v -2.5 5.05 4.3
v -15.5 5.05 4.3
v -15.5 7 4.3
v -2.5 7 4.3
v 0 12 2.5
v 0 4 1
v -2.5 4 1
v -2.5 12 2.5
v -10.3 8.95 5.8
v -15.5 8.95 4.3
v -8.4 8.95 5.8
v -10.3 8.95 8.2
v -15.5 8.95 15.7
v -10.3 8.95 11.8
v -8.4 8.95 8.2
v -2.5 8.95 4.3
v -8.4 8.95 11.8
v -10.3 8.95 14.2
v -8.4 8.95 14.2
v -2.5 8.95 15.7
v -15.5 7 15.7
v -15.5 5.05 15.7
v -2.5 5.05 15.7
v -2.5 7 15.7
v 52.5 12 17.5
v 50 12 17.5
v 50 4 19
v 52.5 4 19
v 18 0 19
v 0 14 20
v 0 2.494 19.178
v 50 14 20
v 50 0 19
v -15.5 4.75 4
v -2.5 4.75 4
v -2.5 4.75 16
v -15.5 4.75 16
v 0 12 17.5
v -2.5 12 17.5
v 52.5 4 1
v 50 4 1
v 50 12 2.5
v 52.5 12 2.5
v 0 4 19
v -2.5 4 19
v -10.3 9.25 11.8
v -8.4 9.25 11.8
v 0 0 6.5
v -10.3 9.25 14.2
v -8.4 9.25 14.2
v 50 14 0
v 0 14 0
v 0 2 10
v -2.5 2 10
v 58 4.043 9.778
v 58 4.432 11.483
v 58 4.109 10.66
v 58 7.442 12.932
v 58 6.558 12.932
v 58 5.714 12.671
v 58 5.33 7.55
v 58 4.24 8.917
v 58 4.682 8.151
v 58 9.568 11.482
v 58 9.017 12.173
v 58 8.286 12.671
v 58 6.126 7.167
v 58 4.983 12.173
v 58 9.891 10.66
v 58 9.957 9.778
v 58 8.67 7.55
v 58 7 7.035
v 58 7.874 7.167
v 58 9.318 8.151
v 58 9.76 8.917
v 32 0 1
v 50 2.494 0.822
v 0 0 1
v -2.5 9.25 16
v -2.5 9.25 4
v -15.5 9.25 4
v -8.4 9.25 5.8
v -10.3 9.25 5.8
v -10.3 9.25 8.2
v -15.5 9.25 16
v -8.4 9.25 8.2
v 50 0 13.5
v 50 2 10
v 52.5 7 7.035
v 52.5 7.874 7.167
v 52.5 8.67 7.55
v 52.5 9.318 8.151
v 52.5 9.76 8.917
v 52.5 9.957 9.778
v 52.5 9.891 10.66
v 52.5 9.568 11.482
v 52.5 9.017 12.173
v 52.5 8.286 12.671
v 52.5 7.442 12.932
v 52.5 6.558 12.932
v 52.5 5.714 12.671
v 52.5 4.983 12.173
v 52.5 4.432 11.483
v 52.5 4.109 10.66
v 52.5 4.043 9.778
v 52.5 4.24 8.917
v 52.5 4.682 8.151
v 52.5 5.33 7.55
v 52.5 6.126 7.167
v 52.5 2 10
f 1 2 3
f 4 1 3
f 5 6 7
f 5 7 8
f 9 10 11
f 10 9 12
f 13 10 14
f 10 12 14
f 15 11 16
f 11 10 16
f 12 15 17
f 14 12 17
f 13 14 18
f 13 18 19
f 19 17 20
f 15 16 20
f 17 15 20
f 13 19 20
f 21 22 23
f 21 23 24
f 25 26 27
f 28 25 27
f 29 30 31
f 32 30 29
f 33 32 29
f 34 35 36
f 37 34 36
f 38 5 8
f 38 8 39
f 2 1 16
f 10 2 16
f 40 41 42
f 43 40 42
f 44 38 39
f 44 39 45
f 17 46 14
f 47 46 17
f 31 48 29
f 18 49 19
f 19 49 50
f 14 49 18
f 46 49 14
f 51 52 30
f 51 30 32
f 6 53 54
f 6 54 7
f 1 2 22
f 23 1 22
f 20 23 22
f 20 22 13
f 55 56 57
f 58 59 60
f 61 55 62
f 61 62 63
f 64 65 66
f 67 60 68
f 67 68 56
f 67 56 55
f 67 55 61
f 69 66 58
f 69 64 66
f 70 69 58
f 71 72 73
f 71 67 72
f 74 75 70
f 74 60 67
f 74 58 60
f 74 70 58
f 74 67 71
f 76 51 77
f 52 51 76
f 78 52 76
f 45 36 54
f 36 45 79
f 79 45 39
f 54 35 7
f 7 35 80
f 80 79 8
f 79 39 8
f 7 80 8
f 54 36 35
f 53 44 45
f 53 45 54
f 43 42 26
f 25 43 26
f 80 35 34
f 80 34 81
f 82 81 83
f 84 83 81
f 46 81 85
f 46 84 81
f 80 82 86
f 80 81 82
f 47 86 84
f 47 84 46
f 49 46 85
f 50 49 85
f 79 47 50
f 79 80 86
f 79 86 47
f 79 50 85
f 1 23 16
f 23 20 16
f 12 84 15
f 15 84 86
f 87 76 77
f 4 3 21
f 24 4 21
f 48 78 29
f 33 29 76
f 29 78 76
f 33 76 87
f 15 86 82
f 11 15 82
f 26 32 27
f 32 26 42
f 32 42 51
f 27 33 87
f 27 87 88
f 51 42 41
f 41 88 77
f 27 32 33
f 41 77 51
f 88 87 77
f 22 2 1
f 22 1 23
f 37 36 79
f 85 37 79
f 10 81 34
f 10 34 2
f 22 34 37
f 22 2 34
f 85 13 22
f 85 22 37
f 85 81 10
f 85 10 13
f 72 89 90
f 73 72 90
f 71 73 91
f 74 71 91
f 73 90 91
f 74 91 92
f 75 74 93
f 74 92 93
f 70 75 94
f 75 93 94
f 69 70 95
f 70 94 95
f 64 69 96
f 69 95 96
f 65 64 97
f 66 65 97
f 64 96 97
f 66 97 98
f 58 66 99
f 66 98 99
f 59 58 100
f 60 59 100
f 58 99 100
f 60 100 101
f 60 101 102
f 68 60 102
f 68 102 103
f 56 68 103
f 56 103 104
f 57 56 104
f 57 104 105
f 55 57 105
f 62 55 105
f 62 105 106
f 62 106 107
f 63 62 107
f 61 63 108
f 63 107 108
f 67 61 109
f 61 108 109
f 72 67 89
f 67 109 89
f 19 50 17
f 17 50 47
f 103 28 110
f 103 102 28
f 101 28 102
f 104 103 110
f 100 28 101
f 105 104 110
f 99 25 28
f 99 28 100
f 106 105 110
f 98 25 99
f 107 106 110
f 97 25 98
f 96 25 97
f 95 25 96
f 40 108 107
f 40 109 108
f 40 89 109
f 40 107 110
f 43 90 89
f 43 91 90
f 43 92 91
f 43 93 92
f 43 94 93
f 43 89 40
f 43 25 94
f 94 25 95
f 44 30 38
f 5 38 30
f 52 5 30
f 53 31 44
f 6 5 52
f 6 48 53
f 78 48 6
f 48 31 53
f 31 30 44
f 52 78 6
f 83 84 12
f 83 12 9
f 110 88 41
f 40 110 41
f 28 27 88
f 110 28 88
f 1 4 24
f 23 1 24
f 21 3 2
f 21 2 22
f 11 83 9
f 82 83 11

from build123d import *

# Parameters (mm, degrees)
SKETCH1_W           = 50
SKETCH1_H           = 20
BOSS_EXTRUDE1_DEPTH = 14
BOSS_EXTRUDE2_DEPTH = 2.5
SKETCH3_W           = 12
SKETCH3_H           = 4.5
SKETCH3_W_2         = 11.4
SKETCH3_H_2         = 3.9
EXTRUDE_THIN1_DEPTH = 13
SKETCH3_3_W         = 11.4
SKETCH3_3_H         = 1.95
BOSS_EXTRUDE3_DEPTH = 13
SKETCH5_W           = 1.9
SKETCH5_H           = 2.4
CUT_EXTRUDE1_DEPTH  = 0.3
SKETCH6_R           = 2.965
BOSS_EXTRUDE4_DEPTH = 5.5
CHAMFER1_SIZE       = 14
CHAMFER1_SIZE_2     = 1
CHAMFER2_SIZE       = 14
CHAMFER2_SIZE_2     = 1
CHAMFER3_START      = -5
CHAMFER3_OUTLINE_W  = 21
CHAMFER3_OUTLINE_H  = 16
CHAMFER3_DEPTH      = 3.756672606
CHAMFER6_START      = 4.059410809
CHAMFER6_OUTLINE_W  = 21
CHAMFER6_OUTLINE_H  = 16
CHAMFER6_DEPTH      = 2.940589191


with BuildPart() as part:
    # Sketch1 → Boss-Extrude1 (new body)
    with BuildSketch(Plane(origin=(0, 0, 0), x_dir=(1, 0, 0), z_dir=(0, 1, 0))):
        with Locations((25, -10)):
            Rectangle(SKETCH1_W, SKETCH1_H)
    extrude(amount=BOSS_EXTRUDE1_DEPTH)

    # Sketch2 → Boss-Extrude2 (add)
    with BuildSketch(Plane.ZY):
        Polygon((2.5, 12), (17.5, 12), (19, 4), (10, 2), (1, 4), align=None)
    boss_extrude2 = extrude(amount=BOSS_EXTRUDE2_DEPTH)

    # Mirror1: Boss-Extrude2 across plane
    add(boss_extrude2.mirror(Plane.ZY.offset(-25)))

    # Sketch3 → Extrude-Thin1 (add)
    with BuildSketch(Plane.ZY.offset(2.5)):
        with Locations((10, 7)):
            Rectangle(SKETCH3_W, SKETCH3_H)
        with Locations((10, 7)):
            Rectangle(SKETCH3_W_2, SKETCH3_H_2, mode=Mode.SUBTRACT)
    extrude(amount=EXTRUDE_THIN1_DEPTH)

    # Sketch5 → Cut-Extrude1 (cut)
    with BuildSketch(Plane(origin=(0, 9.25, 0), x_dir=(1, 0, 0), z_dir=(0, 1, 0))):
        with Locations((-9.35, -13)):
            Rectangle(SKETCH5_W, SKETCH5_H)
        with Locations((-9.35, -7)):
            Rectangle(SKETCH5_W, SKETCH5_H)
    extrude(amount=-CUT_EXTRUDE1_DEPTH, mode=Mode.SUBTRACT)

    # Sketch6 → Boss-Extrude4 (add)
    with BuildSketch(Plane(origin=(52.5, 0, 0), x_dir=(0, 0, -1), z_dir=(1, 0, 0))):
        with Locations((-10, 7)):
            Circle(SKETCH6_R)
    extrude(amount=BOSS_EXTRUDE4_DEPTH)

    # Chamfer1
    # the kernel refuses this chamfer: 14, 1 mm, written as the material it takes off along each edge
    with BuildSketch(Plane(origin=(-36.396578858, 0, 0), x_dir=(0, 1, 0), z_dir=(1, 0, 0))) as chamfer1_piece_1:
        Polygon((CHAMFER1_SIZE, 0), (0, CHAMFER1_SIZE_2), (0, 0), align=None)
    extrude(amount=122.793157716, mode=Mode.SUBTRACT)

    # Chamfer2
    # the kernel refuses this chamfer: 14, 1 mm, written as the material it takes off along each edge
    with BuildSketch(Plane(origin=(86.396578858, 0, 20), x_dir=(0, 1, 0), z_dir=(-1, 0, 0))) as chamfer2_piece_1:
        Polygon((CHAMFER2_SIZE, 0), (0, CHAMFER2_SIZE_2), (0, 0), align=None)
    extrude(amount=122.793157716, mode=Mode.SUBTRACT)

    # Chamfer3: read off the stored shape, not the designer's step
    # Chamfer3 outline → Chamfer3 (cut)
    with BuildSketch(Plane(origin=(0, 0, 0), x_dir=(0.9911382828246236, -0.13033690205825316, 0.025635839781716227), z_dir=(0.13283412332475603, 0.9725053326762371, -0.19128113758764903)).offset(CHAMFER3_START)):
        with Locations((9.5, -13)):
            Rectangle(CHAMFER3_OUTLINE_W, CHAMFER3_OUTLINE_H)
    extrude(amount=CHAMFER3_DEPTH, mode=Mode.SUBTRACT)

    # Chamfer6: read off the stored shape, not the designer's step
    # Chamfer6 outline → Chamfer6 (cut)
    with BuildSketch(Plane(origin=(0, 0, 0), x_dir=(0.9911382828246236, 0.13033690205825316, 0.025635839781716227), z_dir=(0.13283412332475603, -0.9725053326762371, -0.19128113758764903)).offset(CHAMFER6_START)):
        with Locations((40.5, 7)):
            Rectangle(CHAMFER6_OUTLINE_W, CHAMFER6_OUTLINE_H)
    extrude(amount=CHAMFER6_DEPTH, mode=Mode.SUBTRACT)


with BuildPart() as body_2:
    # Sketch3<3> → Boss-Extrude3 (new body)
    with BuildSketch(Plane.ZY.offset(2.5)):
        with Locations((10, 6.025)):
            Rectangle(SKETCH3_3_W, SKETCH3_3_H)
    extrude(amount=BOSS_EXTRUDE3_DEPTH)


solid = Compound([part.part, body_2.part])
